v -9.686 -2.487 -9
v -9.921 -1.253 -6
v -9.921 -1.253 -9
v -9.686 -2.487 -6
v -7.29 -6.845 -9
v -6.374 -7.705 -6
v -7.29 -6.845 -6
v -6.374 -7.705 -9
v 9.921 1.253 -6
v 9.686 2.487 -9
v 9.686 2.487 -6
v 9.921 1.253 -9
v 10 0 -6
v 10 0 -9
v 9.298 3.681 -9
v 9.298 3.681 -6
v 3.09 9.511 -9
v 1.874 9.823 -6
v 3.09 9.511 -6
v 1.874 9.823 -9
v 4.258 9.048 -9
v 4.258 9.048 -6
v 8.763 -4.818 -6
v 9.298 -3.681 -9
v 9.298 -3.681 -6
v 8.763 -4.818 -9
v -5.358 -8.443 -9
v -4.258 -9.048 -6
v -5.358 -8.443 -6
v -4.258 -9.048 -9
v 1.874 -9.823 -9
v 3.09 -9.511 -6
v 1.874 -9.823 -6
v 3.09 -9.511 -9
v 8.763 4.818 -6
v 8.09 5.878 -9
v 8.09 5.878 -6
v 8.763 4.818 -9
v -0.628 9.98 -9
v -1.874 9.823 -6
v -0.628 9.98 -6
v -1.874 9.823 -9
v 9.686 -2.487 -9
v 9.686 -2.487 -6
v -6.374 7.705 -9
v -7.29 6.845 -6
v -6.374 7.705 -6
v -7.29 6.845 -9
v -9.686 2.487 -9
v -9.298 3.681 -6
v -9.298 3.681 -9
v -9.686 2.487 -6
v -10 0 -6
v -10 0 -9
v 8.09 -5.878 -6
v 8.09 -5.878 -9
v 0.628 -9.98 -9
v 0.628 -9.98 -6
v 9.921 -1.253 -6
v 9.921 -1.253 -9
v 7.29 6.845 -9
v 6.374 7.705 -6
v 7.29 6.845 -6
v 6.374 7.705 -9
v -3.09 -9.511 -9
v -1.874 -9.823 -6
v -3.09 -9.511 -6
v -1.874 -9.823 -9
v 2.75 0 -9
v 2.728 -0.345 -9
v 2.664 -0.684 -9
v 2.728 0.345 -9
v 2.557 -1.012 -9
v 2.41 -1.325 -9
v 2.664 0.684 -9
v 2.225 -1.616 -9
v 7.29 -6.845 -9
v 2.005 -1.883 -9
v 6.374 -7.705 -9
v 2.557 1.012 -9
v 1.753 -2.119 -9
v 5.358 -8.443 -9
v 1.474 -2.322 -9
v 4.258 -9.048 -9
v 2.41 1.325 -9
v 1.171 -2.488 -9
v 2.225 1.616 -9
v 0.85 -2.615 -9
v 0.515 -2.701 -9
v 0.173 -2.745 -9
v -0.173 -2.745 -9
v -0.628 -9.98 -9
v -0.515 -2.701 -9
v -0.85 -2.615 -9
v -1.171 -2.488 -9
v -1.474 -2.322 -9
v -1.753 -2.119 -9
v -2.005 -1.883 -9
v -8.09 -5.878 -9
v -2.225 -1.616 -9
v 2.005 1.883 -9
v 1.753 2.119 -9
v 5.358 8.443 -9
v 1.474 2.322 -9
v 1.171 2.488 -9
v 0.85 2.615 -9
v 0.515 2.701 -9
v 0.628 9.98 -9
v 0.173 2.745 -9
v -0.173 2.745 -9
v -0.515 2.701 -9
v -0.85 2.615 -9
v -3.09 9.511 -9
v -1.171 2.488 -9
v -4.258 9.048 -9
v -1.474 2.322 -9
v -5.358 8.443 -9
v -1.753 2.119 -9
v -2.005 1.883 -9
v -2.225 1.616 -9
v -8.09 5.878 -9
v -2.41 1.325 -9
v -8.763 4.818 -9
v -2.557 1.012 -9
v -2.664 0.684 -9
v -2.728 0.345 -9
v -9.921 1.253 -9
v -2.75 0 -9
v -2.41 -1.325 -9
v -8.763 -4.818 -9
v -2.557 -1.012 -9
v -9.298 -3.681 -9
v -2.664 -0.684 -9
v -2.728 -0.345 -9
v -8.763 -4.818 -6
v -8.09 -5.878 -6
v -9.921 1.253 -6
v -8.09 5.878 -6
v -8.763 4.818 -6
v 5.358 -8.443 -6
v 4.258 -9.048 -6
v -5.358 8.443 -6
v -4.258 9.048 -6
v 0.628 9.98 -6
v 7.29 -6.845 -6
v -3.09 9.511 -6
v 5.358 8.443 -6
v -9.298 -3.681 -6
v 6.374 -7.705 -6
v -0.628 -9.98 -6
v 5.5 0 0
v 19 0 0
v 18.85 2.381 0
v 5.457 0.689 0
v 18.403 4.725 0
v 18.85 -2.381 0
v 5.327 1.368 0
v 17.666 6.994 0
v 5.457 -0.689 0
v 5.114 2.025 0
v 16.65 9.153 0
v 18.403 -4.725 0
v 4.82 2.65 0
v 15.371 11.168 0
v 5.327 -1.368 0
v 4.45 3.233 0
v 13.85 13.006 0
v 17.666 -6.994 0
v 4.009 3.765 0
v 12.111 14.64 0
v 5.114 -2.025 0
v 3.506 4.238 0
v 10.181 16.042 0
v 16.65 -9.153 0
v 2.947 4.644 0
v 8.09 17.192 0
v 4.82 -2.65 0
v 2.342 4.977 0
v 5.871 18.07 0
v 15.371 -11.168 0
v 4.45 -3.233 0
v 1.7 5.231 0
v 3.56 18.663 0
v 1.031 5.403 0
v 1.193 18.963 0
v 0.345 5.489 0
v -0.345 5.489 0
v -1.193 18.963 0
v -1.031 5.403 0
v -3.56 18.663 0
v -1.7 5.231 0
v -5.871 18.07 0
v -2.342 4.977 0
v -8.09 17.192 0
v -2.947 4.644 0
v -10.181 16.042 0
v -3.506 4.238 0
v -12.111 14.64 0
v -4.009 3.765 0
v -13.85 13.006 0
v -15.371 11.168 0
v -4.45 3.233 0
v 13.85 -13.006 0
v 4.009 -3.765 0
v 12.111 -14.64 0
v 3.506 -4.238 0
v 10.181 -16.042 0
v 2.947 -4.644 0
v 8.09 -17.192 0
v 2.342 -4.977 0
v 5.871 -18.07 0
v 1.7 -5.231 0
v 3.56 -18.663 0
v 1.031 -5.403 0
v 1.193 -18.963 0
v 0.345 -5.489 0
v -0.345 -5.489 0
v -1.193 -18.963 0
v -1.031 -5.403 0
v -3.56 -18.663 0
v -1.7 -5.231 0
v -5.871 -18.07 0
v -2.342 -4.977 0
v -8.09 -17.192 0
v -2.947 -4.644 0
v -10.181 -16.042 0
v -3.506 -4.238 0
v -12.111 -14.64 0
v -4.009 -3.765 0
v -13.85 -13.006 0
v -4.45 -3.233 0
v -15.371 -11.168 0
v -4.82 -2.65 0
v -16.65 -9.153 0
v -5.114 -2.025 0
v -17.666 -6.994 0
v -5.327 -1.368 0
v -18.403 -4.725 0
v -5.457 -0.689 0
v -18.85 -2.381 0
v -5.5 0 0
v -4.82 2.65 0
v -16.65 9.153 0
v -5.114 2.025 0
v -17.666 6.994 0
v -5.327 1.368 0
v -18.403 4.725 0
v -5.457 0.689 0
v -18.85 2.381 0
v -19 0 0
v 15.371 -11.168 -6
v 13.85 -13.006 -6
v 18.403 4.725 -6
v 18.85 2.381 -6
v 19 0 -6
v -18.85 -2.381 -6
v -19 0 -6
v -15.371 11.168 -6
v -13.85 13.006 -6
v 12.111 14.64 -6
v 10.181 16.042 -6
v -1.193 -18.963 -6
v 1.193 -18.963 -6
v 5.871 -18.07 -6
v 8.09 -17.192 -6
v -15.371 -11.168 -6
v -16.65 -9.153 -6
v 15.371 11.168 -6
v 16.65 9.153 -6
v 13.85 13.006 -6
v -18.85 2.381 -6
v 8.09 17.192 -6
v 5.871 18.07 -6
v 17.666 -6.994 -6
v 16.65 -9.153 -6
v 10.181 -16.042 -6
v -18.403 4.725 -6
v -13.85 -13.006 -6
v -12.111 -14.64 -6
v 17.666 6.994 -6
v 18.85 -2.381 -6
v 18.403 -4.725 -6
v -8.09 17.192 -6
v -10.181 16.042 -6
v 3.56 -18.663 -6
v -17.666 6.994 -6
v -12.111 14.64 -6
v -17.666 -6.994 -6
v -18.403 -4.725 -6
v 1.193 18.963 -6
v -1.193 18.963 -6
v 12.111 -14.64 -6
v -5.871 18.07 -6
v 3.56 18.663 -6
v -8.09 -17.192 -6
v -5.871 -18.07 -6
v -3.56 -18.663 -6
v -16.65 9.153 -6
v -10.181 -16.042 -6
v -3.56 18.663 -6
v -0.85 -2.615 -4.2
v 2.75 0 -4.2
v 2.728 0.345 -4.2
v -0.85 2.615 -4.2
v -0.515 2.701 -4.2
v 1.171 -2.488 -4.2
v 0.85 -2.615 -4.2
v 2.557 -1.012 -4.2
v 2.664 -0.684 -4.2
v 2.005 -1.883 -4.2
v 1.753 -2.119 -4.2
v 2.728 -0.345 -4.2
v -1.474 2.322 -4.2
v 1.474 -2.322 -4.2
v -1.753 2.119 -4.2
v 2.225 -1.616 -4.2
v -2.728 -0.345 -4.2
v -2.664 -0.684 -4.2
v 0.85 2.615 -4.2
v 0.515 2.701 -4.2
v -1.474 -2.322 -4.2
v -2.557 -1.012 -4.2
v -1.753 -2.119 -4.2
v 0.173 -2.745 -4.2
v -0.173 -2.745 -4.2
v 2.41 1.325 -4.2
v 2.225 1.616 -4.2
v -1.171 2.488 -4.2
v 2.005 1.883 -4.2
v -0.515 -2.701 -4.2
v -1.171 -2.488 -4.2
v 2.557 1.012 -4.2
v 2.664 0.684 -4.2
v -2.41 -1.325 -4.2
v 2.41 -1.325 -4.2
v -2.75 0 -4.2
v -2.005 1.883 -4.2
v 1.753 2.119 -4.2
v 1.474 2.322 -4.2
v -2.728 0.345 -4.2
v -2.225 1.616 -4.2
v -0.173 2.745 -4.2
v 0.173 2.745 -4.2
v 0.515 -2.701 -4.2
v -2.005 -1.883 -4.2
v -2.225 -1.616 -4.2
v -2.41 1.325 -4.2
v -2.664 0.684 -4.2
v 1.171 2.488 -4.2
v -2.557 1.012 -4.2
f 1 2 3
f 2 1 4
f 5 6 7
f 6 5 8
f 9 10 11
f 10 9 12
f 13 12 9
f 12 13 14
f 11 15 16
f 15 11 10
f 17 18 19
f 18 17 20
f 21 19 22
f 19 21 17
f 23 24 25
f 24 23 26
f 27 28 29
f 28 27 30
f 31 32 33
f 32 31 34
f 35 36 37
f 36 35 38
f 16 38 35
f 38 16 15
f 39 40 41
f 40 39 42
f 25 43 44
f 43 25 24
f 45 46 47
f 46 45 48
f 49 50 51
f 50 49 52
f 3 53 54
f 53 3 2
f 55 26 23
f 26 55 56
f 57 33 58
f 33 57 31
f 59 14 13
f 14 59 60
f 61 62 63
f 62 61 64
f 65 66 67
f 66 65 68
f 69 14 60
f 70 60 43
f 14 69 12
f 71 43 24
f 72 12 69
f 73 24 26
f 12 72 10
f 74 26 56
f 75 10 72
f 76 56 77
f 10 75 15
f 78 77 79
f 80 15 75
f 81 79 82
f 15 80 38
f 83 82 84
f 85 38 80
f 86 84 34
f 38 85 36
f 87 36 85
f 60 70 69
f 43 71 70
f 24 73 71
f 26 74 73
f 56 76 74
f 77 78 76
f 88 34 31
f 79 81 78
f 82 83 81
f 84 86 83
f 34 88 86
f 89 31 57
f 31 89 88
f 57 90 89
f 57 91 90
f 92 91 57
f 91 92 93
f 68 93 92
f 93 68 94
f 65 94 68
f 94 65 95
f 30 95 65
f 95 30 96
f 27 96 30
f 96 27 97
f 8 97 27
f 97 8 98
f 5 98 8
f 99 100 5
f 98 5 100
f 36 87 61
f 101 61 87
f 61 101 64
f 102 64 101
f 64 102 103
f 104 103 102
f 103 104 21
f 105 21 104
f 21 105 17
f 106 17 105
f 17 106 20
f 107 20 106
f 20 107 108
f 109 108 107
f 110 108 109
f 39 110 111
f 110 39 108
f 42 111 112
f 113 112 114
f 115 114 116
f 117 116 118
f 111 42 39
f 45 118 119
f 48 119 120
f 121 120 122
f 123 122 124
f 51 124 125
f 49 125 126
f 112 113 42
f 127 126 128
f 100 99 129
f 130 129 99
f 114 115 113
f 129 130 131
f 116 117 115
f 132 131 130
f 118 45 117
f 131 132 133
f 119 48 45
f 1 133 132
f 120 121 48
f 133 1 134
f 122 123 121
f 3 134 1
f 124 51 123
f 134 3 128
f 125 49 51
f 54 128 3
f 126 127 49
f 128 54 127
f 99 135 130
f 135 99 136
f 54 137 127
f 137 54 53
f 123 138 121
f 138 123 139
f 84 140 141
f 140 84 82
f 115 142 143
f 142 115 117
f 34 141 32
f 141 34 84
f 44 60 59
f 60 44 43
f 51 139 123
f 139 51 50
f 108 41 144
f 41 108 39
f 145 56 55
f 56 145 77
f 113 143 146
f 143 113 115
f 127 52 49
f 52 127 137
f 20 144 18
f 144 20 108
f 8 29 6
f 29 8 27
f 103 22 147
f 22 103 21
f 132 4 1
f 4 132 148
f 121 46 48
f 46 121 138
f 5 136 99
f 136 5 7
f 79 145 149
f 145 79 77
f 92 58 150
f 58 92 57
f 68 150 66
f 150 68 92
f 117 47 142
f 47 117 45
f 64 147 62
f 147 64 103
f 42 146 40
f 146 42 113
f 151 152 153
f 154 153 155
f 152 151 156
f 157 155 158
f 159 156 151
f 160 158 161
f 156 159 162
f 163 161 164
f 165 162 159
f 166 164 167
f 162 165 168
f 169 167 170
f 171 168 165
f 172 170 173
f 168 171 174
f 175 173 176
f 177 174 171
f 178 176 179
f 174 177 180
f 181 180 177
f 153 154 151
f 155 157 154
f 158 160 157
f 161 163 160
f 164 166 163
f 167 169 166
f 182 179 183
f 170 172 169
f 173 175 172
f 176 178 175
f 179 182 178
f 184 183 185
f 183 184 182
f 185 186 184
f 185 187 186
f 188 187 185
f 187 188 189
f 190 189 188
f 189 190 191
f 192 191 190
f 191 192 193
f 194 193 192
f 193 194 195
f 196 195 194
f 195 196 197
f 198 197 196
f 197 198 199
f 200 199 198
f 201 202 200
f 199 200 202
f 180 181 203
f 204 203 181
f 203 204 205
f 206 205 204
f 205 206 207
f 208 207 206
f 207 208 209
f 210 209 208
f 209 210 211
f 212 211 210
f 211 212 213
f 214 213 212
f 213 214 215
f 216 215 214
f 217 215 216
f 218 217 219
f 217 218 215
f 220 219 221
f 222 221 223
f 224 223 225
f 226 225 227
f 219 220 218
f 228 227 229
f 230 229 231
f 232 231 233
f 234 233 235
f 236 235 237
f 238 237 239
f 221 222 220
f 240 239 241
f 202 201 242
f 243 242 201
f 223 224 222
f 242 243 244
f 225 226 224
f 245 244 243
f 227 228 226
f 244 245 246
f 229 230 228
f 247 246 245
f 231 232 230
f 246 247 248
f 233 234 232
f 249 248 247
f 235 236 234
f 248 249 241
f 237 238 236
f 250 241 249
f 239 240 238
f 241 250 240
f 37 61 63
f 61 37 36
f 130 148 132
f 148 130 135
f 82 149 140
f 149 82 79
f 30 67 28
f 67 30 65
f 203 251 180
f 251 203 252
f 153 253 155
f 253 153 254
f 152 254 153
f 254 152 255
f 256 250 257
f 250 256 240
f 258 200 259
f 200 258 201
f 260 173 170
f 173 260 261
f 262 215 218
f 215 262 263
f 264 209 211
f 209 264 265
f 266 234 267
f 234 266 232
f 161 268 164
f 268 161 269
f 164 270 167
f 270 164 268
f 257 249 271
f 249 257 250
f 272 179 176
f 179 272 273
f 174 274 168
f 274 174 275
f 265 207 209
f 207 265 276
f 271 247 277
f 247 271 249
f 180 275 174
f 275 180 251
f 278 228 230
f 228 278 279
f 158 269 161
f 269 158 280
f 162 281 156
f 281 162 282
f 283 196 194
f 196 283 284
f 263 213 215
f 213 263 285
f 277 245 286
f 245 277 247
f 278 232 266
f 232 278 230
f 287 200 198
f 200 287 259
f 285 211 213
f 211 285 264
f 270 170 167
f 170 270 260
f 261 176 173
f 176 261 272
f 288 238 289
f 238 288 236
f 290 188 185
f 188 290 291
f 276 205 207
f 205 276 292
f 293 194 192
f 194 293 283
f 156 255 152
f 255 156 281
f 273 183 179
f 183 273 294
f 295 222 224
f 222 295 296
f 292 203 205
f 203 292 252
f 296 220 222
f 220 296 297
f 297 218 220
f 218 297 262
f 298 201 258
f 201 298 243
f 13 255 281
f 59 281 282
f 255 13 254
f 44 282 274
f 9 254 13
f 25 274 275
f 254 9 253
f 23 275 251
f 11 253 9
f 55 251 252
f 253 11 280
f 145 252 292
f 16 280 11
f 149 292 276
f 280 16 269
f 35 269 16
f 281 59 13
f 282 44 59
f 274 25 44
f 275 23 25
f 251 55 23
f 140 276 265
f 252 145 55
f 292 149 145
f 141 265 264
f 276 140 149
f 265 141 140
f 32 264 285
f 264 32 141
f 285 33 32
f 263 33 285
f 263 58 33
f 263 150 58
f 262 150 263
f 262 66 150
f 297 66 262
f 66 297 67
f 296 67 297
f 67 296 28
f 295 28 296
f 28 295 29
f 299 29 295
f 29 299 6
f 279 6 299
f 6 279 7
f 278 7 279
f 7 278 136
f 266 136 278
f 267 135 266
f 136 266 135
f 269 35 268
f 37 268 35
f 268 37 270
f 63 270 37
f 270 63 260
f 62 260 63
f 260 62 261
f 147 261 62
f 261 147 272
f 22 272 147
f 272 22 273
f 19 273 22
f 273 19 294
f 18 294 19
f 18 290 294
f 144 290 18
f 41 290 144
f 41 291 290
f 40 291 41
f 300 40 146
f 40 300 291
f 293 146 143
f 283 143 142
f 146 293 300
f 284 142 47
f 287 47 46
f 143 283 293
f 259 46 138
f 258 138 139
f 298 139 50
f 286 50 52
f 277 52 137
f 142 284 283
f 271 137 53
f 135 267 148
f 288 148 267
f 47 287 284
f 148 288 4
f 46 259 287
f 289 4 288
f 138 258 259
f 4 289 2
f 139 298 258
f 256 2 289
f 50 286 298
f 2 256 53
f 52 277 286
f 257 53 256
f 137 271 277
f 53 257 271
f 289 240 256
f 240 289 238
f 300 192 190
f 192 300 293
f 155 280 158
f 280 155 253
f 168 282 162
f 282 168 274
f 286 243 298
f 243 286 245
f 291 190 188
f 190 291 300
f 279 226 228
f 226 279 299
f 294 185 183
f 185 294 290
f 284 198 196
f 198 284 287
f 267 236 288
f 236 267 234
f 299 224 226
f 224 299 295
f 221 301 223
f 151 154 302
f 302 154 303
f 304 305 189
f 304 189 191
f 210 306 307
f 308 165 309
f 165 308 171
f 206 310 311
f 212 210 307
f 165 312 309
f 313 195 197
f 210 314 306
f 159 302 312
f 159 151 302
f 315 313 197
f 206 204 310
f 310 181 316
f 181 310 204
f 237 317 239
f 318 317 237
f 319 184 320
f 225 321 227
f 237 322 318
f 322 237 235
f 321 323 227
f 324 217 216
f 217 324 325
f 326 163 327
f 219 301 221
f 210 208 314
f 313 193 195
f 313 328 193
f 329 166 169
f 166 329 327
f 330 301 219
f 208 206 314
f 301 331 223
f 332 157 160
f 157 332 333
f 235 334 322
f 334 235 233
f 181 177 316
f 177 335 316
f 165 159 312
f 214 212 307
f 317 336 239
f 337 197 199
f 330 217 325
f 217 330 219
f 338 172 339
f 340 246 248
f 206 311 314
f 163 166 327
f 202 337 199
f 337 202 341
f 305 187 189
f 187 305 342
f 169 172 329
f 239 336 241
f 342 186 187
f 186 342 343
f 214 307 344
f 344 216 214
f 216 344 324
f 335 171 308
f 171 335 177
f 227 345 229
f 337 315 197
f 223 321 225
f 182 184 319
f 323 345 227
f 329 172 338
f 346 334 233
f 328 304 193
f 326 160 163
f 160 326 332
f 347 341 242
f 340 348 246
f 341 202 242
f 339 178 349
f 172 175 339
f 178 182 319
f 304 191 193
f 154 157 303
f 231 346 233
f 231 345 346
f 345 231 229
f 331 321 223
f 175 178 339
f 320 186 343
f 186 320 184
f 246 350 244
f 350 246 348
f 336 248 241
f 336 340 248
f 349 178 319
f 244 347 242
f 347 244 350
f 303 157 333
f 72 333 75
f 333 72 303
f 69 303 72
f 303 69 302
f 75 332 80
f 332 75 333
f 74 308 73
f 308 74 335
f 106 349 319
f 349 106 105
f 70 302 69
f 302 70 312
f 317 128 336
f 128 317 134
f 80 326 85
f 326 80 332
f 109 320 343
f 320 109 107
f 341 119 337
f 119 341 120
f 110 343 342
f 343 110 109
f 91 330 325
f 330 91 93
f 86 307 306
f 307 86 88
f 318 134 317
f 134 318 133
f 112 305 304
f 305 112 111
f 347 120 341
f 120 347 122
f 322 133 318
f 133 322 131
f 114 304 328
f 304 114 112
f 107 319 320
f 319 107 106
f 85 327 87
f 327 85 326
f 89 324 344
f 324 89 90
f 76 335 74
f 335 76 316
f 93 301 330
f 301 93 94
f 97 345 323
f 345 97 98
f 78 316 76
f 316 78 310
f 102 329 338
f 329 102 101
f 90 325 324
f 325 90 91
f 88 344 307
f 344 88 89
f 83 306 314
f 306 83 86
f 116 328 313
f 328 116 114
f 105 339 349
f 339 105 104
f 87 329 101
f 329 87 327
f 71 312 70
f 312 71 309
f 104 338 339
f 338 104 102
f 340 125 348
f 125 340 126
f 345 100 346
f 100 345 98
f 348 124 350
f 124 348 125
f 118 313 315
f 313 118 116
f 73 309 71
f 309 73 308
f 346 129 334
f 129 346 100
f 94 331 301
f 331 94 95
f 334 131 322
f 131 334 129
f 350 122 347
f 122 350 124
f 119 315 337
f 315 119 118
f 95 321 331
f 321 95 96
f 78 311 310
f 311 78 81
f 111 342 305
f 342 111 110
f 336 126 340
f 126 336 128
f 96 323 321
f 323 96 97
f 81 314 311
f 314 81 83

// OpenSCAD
$fn = 50;


difference() {
	union() {
		translate(v = [0, 0, -9.0000000000]) {
			cylinder(h = 9, r = 10.0000000000);
		}
		translate(v = [0, 0, -6.0000000000]) {
			cylinder(h = 6, r = 19.0000000000);
		}
	}
	union() {
		translate(v = [0, 0, 0]) {
			rotate(a = [0, 0, 0]) {
				difference() {
					union() {
						#translate(v = [0, 0, -9.0000000000]) {
							cylinder(h = 9, r = 2.2500000000);
						}
						#translate(v = [0, 0, -4.2000000000]) {
							cylinder(h = 4.2000000000, r = 10.0000000000, r1 = 2.7500000000, r2 = 5.5000000000);
						}
						#translate(v = [0, 0, -9.0000000000]) {
							cylinder(h = 9, r = 2.7500000000);
						}
						#translate(v = [0, 0, -9.0000000000]) {
							cylinder(h = 9, r = 2.2500000000);
						}
					}
					union();
				}
			}
		}
	}
}
